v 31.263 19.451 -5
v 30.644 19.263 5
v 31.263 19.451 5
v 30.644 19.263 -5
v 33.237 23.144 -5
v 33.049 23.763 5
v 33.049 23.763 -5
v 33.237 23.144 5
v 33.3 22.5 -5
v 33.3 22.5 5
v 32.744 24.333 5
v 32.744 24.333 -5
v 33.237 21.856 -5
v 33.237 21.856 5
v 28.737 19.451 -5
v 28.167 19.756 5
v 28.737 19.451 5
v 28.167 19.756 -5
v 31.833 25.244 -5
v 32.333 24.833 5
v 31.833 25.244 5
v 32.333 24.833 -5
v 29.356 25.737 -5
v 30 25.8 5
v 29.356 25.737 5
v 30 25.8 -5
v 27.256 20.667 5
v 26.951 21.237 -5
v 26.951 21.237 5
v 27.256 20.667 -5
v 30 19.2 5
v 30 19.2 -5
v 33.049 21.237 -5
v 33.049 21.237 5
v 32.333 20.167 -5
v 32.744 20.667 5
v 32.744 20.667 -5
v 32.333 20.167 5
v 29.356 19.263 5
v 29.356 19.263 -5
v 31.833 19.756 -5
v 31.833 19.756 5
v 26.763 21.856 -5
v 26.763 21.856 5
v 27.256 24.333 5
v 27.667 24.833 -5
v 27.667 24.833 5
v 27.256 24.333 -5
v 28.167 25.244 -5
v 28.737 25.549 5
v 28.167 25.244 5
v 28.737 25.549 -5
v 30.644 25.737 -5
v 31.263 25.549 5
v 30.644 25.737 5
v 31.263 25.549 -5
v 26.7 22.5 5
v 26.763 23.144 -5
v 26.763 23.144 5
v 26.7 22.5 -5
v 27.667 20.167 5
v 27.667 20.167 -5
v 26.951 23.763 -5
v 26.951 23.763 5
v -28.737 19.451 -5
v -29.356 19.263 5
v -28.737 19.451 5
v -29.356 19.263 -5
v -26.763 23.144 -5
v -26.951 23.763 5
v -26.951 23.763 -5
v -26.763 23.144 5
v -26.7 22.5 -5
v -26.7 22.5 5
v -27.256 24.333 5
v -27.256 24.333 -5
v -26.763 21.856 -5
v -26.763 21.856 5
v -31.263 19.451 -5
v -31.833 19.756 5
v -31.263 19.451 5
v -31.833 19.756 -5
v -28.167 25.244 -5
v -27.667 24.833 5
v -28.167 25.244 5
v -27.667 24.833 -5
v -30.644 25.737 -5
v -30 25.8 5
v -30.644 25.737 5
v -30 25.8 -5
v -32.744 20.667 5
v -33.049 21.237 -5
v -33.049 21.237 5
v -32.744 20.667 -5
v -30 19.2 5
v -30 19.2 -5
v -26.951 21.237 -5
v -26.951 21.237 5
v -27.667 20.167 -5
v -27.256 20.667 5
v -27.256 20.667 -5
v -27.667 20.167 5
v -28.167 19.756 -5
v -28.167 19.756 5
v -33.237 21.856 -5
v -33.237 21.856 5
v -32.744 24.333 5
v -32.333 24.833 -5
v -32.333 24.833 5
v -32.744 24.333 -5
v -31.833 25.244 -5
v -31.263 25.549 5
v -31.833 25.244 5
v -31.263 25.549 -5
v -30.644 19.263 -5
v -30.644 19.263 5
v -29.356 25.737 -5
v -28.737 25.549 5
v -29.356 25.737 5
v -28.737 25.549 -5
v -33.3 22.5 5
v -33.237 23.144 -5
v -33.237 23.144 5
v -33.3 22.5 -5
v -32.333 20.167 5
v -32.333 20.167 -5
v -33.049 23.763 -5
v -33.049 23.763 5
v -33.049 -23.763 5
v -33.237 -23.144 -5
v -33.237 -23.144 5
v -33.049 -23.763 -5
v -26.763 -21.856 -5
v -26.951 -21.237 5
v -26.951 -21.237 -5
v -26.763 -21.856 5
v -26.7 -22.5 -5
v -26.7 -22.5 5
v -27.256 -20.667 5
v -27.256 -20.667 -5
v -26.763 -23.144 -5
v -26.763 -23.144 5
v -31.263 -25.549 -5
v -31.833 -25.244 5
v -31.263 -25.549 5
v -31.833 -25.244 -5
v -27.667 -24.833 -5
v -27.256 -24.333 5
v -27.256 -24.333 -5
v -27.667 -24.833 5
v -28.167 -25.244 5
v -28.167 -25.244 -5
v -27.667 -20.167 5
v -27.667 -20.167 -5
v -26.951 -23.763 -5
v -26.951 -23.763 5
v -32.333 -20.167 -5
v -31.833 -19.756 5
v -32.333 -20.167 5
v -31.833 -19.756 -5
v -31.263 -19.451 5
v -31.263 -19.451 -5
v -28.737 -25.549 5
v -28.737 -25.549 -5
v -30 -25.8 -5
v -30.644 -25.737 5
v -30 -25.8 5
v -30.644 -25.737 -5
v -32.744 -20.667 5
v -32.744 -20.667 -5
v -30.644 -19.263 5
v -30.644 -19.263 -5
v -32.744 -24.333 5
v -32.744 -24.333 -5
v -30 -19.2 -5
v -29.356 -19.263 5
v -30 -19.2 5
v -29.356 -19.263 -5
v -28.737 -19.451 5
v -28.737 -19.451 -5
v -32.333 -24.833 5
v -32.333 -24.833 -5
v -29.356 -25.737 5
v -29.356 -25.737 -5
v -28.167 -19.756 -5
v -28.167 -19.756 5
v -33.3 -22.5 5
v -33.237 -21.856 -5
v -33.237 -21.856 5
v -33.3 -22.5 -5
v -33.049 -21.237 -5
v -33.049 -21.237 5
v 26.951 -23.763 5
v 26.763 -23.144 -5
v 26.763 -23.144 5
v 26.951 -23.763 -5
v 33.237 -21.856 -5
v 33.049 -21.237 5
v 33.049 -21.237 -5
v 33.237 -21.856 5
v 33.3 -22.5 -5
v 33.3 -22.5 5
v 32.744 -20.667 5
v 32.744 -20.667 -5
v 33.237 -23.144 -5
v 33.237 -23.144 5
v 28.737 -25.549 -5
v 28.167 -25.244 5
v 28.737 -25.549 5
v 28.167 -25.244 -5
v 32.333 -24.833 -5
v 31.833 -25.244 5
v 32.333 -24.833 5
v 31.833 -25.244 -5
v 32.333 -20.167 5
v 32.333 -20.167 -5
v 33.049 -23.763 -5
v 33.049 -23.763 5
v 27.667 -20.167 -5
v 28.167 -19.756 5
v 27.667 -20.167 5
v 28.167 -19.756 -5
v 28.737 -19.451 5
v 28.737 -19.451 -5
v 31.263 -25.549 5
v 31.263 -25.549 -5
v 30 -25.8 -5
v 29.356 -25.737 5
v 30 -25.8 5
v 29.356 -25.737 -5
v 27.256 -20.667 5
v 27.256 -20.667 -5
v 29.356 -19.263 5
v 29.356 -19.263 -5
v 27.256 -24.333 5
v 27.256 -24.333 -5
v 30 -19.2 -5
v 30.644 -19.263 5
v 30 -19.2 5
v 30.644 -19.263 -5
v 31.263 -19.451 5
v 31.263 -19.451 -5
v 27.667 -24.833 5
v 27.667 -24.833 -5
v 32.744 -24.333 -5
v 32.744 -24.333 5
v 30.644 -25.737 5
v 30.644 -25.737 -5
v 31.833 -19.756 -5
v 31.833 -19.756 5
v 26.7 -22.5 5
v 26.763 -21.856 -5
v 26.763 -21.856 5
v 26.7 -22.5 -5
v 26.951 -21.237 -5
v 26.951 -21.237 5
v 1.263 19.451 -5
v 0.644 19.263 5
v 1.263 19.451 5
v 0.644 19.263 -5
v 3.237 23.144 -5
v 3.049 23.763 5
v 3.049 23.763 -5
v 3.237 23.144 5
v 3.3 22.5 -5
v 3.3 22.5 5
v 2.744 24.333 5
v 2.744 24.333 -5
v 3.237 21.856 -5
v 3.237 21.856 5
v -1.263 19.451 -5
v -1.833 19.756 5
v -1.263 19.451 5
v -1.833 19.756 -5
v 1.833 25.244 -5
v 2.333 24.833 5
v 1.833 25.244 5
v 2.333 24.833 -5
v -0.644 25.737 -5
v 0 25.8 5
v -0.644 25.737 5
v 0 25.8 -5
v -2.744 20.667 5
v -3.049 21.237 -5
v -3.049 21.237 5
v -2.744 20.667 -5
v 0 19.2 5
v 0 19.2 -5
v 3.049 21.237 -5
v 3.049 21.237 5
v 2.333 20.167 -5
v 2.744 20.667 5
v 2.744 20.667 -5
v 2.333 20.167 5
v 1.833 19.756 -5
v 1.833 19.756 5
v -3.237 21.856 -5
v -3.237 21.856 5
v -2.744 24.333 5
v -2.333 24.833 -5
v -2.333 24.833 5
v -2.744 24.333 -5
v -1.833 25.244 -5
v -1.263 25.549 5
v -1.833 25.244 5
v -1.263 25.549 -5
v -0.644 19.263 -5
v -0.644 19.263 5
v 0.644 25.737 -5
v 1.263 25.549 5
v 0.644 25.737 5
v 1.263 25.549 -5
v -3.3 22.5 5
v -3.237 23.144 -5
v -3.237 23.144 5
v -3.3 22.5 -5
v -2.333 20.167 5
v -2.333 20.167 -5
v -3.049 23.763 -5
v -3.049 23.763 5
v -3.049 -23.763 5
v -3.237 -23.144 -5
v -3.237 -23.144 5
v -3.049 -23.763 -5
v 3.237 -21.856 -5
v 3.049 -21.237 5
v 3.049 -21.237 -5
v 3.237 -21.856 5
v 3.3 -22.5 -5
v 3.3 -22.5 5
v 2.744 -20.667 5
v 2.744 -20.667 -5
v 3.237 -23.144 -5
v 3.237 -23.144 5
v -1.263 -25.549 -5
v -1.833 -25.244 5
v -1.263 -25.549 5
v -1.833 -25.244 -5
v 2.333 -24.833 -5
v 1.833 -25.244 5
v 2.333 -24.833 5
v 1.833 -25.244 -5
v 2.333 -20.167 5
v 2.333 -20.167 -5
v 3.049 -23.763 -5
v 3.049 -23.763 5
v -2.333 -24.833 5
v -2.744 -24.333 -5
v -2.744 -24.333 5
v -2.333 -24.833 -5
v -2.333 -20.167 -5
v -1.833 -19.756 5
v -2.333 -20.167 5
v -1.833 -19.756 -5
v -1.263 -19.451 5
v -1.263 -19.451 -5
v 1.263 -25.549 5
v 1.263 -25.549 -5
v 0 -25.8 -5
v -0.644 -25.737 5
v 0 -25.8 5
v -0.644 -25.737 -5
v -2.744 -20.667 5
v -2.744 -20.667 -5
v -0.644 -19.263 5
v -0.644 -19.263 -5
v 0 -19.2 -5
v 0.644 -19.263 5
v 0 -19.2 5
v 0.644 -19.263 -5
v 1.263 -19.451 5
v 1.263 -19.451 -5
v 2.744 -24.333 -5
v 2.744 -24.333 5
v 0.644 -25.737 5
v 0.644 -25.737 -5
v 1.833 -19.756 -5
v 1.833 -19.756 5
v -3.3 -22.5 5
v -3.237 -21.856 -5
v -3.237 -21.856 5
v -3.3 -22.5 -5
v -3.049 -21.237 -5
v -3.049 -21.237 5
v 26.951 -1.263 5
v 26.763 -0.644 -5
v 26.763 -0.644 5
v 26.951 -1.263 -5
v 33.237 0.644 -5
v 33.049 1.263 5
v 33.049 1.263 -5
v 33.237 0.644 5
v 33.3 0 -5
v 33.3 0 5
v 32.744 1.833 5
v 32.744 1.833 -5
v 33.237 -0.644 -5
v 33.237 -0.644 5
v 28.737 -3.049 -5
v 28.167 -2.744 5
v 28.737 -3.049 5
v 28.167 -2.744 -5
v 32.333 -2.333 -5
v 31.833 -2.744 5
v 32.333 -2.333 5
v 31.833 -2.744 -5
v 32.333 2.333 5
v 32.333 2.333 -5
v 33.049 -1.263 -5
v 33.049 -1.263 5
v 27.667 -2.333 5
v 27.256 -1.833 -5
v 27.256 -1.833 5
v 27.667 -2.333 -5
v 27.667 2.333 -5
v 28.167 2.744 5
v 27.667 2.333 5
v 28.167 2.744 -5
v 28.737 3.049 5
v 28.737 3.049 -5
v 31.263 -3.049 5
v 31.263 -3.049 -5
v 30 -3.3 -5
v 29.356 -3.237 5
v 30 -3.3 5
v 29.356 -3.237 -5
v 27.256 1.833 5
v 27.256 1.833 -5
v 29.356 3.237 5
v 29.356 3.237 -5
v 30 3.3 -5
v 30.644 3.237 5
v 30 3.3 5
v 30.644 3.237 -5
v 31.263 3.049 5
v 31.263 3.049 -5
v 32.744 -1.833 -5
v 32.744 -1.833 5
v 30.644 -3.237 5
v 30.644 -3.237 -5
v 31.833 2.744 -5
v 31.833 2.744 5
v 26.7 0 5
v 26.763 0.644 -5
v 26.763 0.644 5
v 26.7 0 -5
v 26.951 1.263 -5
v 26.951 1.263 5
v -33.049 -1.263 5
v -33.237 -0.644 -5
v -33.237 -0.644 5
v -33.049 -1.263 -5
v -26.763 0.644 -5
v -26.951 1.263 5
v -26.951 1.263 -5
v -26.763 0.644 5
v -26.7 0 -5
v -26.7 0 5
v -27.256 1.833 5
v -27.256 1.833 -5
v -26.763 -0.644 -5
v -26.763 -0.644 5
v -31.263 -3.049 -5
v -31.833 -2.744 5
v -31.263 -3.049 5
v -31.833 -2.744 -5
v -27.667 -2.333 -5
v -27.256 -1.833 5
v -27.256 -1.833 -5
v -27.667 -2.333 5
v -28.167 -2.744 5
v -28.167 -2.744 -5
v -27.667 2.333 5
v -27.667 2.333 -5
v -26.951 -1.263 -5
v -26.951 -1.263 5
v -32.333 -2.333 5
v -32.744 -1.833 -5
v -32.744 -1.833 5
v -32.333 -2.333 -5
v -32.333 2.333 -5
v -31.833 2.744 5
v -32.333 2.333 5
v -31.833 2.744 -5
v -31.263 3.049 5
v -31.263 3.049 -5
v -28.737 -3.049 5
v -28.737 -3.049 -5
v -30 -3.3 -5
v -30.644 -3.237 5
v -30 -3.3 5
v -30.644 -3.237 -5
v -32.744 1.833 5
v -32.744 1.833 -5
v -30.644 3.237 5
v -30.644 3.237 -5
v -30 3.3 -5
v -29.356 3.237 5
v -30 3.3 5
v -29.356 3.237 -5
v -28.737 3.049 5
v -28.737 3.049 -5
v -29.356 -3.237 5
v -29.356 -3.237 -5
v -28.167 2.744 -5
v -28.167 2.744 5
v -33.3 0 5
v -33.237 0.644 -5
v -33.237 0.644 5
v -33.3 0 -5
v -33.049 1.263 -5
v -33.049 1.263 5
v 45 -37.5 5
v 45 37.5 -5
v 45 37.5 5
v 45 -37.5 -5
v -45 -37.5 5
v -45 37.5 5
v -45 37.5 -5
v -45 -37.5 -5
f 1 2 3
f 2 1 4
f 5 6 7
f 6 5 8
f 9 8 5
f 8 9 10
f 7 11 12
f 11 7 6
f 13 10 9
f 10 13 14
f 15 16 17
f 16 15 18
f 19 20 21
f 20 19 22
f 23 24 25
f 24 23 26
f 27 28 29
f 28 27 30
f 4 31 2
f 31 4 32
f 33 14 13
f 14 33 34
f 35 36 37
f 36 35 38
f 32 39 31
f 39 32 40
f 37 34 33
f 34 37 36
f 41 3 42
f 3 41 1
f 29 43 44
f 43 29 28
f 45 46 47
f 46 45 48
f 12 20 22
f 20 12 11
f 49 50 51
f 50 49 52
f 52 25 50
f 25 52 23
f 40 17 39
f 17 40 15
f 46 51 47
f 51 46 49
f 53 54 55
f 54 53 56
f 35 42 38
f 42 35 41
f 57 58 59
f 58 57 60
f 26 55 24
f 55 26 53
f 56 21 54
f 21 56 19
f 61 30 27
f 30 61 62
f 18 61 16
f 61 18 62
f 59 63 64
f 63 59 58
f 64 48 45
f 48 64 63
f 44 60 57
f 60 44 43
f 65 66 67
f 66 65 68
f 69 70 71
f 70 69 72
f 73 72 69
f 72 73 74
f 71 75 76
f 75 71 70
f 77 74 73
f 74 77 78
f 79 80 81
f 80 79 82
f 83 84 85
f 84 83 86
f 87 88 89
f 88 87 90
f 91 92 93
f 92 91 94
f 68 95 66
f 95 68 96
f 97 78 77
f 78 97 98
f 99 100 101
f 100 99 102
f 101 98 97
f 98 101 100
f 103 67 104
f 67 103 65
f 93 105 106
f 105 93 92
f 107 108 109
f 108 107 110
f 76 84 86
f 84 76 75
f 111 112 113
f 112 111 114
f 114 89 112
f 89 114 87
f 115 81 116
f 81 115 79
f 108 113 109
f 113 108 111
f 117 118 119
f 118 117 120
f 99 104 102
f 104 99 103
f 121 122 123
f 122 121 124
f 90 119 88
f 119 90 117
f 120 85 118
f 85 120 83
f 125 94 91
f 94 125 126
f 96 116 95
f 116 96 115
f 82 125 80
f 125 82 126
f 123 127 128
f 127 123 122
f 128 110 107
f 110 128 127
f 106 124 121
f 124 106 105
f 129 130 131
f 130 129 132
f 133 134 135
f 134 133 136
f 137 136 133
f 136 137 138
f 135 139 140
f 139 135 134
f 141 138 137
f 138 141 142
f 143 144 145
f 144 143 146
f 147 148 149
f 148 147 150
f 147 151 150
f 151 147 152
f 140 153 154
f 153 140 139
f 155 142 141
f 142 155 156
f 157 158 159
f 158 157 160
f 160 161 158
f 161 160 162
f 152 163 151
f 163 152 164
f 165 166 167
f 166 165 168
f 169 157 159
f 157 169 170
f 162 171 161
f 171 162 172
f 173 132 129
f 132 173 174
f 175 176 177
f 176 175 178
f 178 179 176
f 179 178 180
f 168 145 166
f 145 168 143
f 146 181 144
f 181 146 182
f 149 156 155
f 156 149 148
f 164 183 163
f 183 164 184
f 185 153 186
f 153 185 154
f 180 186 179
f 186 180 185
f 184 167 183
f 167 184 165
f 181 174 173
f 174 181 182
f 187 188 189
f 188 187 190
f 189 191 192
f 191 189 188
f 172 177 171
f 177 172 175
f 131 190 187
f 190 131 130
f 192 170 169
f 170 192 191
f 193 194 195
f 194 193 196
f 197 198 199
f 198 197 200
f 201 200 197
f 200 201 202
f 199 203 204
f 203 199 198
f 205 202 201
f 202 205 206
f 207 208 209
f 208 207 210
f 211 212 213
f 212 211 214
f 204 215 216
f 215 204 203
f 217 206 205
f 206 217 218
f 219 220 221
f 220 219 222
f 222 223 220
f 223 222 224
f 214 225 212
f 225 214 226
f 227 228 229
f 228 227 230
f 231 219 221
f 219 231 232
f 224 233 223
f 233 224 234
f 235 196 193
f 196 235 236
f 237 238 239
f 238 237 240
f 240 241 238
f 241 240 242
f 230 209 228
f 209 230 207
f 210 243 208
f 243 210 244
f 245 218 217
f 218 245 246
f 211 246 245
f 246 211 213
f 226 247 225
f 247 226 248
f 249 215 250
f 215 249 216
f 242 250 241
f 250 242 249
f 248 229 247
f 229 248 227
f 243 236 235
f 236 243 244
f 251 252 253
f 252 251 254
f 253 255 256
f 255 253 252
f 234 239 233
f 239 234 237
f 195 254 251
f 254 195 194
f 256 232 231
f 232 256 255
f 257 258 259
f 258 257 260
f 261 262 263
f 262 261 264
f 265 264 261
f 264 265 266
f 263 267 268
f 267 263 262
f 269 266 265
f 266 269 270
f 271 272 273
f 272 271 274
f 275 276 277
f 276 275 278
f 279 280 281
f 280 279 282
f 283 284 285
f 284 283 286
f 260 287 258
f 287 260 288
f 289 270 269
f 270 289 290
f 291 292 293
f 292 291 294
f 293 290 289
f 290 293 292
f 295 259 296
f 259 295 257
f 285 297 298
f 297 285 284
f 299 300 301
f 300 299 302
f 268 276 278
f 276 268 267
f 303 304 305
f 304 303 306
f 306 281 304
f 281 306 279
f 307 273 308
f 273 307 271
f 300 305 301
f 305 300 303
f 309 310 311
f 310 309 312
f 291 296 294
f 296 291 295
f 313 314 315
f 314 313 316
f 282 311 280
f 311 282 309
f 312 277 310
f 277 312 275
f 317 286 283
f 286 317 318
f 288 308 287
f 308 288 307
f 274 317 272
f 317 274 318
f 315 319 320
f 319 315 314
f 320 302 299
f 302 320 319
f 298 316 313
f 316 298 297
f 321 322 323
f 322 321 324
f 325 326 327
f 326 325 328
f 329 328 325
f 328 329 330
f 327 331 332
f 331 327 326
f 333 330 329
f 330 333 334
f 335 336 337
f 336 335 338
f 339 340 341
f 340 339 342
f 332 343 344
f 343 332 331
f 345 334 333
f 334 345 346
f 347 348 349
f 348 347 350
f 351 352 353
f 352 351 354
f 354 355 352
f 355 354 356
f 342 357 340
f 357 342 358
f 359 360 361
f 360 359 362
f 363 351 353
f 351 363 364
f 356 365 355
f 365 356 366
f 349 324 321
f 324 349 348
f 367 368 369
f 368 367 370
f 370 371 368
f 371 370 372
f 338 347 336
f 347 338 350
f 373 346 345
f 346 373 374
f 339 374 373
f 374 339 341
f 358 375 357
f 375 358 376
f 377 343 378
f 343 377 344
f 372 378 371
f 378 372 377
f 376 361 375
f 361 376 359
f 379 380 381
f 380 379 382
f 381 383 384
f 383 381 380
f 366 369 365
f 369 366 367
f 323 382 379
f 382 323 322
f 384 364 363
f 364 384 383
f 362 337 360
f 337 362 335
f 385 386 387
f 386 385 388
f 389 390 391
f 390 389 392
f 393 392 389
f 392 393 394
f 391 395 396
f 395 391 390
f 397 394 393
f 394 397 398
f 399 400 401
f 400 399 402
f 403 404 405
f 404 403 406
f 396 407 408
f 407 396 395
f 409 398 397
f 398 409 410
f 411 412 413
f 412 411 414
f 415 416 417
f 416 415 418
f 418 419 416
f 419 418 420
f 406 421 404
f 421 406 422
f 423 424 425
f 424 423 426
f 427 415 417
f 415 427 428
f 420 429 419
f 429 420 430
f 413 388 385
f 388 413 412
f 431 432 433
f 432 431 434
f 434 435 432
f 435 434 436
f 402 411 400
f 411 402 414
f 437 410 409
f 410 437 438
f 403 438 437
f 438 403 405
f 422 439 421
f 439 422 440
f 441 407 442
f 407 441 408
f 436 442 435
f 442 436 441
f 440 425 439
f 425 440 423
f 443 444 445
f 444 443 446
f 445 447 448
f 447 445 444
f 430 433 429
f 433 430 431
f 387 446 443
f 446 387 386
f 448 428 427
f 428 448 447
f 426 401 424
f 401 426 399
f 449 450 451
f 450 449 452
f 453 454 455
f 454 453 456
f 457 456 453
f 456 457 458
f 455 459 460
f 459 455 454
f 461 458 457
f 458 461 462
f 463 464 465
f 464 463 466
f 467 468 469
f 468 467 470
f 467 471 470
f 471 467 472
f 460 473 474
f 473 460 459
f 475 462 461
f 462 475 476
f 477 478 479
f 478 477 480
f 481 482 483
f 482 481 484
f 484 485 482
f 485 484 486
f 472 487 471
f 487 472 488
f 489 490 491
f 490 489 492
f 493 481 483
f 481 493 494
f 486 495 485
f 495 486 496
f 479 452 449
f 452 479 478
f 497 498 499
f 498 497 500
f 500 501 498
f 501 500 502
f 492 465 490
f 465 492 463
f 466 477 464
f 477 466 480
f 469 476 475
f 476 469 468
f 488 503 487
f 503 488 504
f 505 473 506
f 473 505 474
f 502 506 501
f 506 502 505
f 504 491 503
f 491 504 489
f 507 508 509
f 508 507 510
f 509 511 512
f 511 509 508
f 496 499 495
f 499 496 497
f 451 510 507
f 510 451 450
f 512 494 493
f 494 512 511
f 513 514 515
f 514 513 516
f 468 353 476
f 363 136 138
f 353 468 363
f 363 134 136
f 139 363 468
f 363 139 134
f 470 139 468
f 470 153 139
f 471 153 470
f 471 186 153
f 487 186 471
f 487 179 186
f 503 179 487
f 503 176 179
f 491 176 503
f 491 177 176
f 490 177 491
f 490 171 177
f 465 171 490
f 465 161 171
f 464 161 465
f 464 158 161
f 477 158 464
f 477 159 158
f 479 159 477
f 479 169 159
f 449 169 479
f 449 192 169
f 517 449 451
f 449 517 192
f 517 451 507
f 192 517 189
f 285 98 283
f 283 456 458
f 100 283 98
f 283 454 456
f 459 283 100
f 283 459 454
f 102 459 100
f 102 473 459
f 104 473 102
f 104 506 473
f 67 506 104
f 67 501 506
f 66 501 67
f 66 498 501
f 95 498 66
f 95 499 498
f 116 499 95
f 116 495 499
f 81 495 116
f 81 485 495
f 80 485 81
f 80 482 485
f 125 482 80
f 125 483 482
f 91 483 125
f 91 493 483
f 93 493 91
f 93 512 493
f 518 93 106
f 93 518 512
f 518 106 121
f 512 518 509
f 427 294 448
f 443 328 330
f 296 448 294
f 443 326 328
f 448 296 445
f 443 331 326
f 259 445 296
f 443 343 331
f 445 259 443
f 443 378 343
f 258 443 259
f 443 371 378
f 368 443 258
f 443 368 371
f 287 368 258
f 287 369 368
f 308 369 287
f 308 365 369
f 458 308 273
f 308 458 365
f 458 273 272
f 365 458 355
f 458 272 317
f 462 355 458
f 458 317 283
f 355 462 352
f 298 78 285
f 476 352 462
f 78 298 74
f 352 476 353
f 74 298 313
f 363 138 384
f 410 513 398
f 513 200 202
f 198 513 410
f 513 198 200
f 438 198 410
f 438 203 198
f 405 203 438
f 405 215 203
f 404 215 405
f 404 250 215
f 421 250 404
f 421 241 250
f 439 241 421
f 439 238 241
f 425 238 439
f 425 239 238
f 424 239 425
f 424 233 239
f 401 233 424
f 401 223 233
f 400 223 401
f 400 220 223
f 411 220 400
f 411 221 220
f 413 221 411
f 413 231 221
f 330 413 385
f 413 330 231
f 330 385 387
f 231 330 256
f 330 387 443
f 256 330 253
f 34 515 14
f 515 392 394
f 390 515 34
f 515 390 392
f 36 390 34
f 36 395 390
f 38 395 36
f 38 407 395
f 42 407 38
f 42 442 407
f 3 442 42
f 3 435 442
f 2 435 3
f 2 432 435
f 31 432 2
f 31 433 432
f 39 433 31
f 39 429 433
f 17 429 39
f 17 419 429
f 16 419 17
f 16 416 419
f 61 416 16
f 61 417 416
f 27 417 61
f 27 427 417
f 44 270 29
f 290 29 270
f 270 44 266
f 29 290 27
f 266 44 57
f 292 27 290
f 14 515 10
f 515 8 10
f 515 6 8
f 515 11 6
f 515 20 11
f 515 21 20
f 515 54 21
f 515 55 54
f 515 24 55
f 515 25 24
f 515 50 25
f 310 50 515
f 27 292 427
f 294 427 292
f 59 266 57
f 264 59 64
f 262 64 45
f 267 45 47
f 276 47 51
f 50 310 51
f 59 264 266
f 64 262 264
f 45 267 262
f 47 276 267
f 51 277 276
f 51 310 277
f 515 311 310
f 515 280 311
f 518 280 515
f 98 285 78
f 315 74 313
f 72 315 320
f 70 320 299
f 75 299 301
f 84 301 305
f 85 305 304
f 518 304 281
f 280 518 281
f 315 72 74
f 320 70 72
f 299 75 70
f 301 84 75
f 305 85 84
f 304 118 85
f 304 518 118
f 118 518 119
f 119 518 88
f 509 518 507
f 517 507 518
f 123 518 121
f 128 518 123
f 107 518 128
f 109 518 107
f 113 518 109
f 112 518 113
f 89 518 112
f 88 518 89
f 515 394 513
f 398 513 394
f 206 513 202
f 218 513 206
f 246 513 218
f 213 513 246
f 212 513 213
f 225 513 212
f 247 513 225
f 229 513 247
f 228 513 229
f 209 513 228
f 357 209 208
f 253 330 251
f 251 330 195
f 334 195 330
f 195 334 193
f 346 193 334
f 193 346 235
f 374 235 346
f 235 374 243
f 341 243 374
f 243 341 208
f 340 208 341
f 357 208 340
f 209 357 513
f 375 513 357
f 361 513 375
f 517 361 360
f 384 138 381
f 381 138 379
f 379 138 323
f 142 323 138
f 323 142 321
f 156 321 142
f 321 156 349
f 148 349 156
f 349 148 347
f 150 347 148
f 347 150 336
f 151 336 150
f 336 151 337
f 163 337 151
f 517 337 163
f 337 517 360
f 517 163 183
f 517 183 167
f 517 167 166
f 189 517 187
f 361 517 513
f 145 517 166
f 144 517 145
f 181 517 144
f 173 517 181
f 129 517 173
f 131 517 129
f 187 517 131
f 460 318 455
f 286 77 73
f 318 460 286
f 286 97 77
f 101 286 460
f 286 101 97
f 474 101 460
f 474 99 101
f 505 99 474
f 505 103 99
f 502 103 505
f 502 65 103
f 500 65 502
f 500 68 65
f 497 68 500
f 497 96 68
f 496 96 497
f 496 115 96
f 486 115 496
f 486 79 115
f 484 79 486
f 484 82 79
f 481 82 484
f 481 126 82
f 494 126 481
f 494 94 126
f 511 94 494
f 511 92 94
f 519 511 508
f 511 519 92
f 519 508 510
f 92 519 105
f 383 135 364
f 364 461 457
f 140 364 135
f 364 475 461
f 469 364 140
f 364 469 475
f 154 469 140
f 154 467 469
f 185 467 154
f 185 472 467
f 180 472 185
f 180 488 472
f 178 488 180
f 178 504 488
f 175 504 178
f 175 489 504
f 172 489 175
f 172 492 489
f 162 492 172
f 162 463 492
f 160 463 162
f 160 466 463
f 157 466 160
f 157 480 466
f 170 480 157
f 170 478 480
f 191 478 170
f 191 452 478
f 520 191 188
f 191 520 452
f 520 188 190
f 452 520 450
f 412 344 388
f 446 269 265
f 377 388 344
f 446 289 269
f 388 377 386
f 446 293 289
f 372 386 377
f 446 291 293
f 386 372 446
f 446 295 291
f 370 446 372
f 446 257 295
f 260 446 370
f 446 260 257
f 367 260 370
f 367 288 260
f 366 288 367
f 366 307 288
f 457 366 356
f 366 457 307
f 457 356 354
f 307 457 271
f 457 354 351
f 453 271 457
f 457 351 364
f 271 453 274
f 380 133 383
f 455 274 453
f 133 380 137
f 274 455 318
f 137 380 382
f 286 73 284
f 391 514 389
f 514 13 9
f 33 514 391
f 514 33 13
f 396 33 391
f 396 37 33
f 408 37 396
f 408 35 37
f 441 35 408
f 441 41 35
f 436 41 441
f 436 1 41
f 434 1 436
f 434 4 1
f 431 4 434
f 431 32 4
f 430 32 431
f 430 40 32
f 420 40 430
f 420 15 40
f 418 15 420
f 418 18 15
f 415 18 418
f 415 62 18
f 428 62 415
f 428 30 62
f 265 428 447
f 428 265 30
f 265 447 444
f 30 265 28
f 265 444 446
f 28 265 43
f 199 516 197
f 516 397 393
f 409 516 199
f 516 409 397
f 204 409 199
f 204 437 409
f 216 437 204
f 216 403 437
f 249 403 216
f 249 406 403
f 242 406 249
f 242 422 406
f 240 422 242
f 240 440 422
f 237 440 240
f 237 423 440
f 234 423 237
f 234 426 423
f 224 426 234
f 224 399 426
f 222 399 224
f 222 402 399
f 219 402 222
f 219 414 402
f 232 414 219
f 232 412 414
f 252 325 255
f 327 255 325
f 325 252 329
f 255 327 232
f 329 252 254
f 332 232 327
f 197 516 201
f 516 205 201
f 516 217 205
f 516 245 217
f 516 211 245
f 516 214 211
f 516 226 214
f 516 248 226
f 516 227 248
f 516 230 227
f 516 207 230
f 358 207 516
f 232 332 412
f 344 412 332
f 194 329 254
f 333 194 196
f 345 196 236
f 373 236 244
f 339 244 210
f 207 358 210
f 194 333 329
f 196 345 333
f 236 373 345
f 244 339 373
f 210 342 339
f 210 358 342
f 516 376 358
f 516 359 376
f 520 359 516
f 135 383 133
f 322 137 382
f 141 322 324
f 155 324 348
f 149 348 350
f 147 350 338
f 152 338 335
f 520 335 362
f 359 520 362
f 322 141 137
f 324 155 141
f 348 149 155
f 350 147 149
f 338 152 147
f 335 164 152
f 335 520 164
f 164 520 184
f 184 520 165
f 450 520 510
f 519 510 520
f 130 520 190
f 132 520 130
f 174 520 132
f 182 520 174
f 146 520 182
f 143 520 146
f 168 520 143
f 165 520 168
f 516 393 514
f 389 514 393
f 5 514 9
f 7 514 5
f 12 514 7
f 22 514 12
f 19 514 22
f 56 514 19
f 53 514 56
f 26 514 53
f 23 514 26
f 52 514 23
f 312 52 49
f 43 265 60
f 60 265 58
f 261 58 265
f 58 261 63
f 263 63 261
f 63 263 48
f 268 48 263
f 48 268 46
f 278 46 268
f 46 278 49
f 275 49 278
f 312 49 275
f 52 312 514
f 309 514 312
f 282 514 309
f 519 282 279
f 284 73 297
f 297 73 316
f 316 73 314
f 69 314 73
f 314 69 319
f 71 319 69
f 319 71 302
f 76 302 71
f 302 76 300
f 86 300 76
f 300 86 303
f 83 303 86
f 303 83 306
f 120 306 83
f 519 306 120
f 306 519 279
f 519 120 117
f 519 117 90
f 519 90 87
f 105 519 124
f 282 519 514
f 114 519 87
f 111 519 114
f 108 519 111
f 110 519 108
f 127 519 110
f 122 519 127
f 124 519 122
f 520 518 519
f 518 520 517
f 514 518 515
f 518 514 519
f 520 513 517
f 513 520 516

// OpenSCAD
$fn = 32;

// ----------------------------------------------------------------------
// Corner plate 90 x 75 x 10
// 8 holes, centres taken from the edge offset
// ----------------------------------------------------------------------

// --- parameters (mm) ---
plate = [90, 75, 10];  // overall size (x, y, z)
holes = 8;             // number of holes the drawing asks for
hole_d = 6.6;          // hole diameter
edge = 15;             // hole centre offset from the plate edge

// --- derived feature positions (mm) ---
corner_x = plate[0] / 2 - edge;  // = 30   corner hole X
corner_y = plate[1] / 2 - edge;  // = 22.5   corner hole Y
feature_centers = [
  [corner_x, corner_y],
  [-corner_x, corner_y],
  [-corner_x, -corner_y],
  [corner_x, -corner_y],
  [0, corner_y],
  [0, -corner_y],
  [corner_x, 0],
  [-corner_x, 0]
];   // hole centres the loop below drills

// plate outline, every hole drilled through with the same cutters
difference() {
  cube(plate, center = true);
  for (centre = feature_centers)
    translate([centre[0], centre[1], 0])
      cylinder(d = hole_d, h = plate[2] + 2, center = true);
}
